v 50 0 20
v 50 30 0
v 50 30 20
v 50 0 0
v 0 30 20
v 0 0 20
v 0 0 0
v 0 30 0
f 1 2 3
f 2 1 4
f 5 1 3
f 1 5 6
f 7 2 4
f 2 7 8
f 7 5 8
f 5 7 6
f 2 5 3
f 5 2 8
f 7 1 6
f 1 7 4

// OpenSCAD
//Thickness of the wall

thickness = 10;

// Outer dimensions of the wall
outer_width = 50;
outer_height = 30;
outer_depth = 20;

// Inner dimensions of the wall
inner_width = outer_width - 2 * thickness;
inner_height = outer_height - 2 * thickness;
inner_depth = outer_depth - 2 * thickness;

// Create the thick wall
difference() {
  cube([outer_width, outer_height, outer_depth]);
  translate([0, 0, -0.1])
    cube([inner_width, inner_height, inner_depth]);
}
